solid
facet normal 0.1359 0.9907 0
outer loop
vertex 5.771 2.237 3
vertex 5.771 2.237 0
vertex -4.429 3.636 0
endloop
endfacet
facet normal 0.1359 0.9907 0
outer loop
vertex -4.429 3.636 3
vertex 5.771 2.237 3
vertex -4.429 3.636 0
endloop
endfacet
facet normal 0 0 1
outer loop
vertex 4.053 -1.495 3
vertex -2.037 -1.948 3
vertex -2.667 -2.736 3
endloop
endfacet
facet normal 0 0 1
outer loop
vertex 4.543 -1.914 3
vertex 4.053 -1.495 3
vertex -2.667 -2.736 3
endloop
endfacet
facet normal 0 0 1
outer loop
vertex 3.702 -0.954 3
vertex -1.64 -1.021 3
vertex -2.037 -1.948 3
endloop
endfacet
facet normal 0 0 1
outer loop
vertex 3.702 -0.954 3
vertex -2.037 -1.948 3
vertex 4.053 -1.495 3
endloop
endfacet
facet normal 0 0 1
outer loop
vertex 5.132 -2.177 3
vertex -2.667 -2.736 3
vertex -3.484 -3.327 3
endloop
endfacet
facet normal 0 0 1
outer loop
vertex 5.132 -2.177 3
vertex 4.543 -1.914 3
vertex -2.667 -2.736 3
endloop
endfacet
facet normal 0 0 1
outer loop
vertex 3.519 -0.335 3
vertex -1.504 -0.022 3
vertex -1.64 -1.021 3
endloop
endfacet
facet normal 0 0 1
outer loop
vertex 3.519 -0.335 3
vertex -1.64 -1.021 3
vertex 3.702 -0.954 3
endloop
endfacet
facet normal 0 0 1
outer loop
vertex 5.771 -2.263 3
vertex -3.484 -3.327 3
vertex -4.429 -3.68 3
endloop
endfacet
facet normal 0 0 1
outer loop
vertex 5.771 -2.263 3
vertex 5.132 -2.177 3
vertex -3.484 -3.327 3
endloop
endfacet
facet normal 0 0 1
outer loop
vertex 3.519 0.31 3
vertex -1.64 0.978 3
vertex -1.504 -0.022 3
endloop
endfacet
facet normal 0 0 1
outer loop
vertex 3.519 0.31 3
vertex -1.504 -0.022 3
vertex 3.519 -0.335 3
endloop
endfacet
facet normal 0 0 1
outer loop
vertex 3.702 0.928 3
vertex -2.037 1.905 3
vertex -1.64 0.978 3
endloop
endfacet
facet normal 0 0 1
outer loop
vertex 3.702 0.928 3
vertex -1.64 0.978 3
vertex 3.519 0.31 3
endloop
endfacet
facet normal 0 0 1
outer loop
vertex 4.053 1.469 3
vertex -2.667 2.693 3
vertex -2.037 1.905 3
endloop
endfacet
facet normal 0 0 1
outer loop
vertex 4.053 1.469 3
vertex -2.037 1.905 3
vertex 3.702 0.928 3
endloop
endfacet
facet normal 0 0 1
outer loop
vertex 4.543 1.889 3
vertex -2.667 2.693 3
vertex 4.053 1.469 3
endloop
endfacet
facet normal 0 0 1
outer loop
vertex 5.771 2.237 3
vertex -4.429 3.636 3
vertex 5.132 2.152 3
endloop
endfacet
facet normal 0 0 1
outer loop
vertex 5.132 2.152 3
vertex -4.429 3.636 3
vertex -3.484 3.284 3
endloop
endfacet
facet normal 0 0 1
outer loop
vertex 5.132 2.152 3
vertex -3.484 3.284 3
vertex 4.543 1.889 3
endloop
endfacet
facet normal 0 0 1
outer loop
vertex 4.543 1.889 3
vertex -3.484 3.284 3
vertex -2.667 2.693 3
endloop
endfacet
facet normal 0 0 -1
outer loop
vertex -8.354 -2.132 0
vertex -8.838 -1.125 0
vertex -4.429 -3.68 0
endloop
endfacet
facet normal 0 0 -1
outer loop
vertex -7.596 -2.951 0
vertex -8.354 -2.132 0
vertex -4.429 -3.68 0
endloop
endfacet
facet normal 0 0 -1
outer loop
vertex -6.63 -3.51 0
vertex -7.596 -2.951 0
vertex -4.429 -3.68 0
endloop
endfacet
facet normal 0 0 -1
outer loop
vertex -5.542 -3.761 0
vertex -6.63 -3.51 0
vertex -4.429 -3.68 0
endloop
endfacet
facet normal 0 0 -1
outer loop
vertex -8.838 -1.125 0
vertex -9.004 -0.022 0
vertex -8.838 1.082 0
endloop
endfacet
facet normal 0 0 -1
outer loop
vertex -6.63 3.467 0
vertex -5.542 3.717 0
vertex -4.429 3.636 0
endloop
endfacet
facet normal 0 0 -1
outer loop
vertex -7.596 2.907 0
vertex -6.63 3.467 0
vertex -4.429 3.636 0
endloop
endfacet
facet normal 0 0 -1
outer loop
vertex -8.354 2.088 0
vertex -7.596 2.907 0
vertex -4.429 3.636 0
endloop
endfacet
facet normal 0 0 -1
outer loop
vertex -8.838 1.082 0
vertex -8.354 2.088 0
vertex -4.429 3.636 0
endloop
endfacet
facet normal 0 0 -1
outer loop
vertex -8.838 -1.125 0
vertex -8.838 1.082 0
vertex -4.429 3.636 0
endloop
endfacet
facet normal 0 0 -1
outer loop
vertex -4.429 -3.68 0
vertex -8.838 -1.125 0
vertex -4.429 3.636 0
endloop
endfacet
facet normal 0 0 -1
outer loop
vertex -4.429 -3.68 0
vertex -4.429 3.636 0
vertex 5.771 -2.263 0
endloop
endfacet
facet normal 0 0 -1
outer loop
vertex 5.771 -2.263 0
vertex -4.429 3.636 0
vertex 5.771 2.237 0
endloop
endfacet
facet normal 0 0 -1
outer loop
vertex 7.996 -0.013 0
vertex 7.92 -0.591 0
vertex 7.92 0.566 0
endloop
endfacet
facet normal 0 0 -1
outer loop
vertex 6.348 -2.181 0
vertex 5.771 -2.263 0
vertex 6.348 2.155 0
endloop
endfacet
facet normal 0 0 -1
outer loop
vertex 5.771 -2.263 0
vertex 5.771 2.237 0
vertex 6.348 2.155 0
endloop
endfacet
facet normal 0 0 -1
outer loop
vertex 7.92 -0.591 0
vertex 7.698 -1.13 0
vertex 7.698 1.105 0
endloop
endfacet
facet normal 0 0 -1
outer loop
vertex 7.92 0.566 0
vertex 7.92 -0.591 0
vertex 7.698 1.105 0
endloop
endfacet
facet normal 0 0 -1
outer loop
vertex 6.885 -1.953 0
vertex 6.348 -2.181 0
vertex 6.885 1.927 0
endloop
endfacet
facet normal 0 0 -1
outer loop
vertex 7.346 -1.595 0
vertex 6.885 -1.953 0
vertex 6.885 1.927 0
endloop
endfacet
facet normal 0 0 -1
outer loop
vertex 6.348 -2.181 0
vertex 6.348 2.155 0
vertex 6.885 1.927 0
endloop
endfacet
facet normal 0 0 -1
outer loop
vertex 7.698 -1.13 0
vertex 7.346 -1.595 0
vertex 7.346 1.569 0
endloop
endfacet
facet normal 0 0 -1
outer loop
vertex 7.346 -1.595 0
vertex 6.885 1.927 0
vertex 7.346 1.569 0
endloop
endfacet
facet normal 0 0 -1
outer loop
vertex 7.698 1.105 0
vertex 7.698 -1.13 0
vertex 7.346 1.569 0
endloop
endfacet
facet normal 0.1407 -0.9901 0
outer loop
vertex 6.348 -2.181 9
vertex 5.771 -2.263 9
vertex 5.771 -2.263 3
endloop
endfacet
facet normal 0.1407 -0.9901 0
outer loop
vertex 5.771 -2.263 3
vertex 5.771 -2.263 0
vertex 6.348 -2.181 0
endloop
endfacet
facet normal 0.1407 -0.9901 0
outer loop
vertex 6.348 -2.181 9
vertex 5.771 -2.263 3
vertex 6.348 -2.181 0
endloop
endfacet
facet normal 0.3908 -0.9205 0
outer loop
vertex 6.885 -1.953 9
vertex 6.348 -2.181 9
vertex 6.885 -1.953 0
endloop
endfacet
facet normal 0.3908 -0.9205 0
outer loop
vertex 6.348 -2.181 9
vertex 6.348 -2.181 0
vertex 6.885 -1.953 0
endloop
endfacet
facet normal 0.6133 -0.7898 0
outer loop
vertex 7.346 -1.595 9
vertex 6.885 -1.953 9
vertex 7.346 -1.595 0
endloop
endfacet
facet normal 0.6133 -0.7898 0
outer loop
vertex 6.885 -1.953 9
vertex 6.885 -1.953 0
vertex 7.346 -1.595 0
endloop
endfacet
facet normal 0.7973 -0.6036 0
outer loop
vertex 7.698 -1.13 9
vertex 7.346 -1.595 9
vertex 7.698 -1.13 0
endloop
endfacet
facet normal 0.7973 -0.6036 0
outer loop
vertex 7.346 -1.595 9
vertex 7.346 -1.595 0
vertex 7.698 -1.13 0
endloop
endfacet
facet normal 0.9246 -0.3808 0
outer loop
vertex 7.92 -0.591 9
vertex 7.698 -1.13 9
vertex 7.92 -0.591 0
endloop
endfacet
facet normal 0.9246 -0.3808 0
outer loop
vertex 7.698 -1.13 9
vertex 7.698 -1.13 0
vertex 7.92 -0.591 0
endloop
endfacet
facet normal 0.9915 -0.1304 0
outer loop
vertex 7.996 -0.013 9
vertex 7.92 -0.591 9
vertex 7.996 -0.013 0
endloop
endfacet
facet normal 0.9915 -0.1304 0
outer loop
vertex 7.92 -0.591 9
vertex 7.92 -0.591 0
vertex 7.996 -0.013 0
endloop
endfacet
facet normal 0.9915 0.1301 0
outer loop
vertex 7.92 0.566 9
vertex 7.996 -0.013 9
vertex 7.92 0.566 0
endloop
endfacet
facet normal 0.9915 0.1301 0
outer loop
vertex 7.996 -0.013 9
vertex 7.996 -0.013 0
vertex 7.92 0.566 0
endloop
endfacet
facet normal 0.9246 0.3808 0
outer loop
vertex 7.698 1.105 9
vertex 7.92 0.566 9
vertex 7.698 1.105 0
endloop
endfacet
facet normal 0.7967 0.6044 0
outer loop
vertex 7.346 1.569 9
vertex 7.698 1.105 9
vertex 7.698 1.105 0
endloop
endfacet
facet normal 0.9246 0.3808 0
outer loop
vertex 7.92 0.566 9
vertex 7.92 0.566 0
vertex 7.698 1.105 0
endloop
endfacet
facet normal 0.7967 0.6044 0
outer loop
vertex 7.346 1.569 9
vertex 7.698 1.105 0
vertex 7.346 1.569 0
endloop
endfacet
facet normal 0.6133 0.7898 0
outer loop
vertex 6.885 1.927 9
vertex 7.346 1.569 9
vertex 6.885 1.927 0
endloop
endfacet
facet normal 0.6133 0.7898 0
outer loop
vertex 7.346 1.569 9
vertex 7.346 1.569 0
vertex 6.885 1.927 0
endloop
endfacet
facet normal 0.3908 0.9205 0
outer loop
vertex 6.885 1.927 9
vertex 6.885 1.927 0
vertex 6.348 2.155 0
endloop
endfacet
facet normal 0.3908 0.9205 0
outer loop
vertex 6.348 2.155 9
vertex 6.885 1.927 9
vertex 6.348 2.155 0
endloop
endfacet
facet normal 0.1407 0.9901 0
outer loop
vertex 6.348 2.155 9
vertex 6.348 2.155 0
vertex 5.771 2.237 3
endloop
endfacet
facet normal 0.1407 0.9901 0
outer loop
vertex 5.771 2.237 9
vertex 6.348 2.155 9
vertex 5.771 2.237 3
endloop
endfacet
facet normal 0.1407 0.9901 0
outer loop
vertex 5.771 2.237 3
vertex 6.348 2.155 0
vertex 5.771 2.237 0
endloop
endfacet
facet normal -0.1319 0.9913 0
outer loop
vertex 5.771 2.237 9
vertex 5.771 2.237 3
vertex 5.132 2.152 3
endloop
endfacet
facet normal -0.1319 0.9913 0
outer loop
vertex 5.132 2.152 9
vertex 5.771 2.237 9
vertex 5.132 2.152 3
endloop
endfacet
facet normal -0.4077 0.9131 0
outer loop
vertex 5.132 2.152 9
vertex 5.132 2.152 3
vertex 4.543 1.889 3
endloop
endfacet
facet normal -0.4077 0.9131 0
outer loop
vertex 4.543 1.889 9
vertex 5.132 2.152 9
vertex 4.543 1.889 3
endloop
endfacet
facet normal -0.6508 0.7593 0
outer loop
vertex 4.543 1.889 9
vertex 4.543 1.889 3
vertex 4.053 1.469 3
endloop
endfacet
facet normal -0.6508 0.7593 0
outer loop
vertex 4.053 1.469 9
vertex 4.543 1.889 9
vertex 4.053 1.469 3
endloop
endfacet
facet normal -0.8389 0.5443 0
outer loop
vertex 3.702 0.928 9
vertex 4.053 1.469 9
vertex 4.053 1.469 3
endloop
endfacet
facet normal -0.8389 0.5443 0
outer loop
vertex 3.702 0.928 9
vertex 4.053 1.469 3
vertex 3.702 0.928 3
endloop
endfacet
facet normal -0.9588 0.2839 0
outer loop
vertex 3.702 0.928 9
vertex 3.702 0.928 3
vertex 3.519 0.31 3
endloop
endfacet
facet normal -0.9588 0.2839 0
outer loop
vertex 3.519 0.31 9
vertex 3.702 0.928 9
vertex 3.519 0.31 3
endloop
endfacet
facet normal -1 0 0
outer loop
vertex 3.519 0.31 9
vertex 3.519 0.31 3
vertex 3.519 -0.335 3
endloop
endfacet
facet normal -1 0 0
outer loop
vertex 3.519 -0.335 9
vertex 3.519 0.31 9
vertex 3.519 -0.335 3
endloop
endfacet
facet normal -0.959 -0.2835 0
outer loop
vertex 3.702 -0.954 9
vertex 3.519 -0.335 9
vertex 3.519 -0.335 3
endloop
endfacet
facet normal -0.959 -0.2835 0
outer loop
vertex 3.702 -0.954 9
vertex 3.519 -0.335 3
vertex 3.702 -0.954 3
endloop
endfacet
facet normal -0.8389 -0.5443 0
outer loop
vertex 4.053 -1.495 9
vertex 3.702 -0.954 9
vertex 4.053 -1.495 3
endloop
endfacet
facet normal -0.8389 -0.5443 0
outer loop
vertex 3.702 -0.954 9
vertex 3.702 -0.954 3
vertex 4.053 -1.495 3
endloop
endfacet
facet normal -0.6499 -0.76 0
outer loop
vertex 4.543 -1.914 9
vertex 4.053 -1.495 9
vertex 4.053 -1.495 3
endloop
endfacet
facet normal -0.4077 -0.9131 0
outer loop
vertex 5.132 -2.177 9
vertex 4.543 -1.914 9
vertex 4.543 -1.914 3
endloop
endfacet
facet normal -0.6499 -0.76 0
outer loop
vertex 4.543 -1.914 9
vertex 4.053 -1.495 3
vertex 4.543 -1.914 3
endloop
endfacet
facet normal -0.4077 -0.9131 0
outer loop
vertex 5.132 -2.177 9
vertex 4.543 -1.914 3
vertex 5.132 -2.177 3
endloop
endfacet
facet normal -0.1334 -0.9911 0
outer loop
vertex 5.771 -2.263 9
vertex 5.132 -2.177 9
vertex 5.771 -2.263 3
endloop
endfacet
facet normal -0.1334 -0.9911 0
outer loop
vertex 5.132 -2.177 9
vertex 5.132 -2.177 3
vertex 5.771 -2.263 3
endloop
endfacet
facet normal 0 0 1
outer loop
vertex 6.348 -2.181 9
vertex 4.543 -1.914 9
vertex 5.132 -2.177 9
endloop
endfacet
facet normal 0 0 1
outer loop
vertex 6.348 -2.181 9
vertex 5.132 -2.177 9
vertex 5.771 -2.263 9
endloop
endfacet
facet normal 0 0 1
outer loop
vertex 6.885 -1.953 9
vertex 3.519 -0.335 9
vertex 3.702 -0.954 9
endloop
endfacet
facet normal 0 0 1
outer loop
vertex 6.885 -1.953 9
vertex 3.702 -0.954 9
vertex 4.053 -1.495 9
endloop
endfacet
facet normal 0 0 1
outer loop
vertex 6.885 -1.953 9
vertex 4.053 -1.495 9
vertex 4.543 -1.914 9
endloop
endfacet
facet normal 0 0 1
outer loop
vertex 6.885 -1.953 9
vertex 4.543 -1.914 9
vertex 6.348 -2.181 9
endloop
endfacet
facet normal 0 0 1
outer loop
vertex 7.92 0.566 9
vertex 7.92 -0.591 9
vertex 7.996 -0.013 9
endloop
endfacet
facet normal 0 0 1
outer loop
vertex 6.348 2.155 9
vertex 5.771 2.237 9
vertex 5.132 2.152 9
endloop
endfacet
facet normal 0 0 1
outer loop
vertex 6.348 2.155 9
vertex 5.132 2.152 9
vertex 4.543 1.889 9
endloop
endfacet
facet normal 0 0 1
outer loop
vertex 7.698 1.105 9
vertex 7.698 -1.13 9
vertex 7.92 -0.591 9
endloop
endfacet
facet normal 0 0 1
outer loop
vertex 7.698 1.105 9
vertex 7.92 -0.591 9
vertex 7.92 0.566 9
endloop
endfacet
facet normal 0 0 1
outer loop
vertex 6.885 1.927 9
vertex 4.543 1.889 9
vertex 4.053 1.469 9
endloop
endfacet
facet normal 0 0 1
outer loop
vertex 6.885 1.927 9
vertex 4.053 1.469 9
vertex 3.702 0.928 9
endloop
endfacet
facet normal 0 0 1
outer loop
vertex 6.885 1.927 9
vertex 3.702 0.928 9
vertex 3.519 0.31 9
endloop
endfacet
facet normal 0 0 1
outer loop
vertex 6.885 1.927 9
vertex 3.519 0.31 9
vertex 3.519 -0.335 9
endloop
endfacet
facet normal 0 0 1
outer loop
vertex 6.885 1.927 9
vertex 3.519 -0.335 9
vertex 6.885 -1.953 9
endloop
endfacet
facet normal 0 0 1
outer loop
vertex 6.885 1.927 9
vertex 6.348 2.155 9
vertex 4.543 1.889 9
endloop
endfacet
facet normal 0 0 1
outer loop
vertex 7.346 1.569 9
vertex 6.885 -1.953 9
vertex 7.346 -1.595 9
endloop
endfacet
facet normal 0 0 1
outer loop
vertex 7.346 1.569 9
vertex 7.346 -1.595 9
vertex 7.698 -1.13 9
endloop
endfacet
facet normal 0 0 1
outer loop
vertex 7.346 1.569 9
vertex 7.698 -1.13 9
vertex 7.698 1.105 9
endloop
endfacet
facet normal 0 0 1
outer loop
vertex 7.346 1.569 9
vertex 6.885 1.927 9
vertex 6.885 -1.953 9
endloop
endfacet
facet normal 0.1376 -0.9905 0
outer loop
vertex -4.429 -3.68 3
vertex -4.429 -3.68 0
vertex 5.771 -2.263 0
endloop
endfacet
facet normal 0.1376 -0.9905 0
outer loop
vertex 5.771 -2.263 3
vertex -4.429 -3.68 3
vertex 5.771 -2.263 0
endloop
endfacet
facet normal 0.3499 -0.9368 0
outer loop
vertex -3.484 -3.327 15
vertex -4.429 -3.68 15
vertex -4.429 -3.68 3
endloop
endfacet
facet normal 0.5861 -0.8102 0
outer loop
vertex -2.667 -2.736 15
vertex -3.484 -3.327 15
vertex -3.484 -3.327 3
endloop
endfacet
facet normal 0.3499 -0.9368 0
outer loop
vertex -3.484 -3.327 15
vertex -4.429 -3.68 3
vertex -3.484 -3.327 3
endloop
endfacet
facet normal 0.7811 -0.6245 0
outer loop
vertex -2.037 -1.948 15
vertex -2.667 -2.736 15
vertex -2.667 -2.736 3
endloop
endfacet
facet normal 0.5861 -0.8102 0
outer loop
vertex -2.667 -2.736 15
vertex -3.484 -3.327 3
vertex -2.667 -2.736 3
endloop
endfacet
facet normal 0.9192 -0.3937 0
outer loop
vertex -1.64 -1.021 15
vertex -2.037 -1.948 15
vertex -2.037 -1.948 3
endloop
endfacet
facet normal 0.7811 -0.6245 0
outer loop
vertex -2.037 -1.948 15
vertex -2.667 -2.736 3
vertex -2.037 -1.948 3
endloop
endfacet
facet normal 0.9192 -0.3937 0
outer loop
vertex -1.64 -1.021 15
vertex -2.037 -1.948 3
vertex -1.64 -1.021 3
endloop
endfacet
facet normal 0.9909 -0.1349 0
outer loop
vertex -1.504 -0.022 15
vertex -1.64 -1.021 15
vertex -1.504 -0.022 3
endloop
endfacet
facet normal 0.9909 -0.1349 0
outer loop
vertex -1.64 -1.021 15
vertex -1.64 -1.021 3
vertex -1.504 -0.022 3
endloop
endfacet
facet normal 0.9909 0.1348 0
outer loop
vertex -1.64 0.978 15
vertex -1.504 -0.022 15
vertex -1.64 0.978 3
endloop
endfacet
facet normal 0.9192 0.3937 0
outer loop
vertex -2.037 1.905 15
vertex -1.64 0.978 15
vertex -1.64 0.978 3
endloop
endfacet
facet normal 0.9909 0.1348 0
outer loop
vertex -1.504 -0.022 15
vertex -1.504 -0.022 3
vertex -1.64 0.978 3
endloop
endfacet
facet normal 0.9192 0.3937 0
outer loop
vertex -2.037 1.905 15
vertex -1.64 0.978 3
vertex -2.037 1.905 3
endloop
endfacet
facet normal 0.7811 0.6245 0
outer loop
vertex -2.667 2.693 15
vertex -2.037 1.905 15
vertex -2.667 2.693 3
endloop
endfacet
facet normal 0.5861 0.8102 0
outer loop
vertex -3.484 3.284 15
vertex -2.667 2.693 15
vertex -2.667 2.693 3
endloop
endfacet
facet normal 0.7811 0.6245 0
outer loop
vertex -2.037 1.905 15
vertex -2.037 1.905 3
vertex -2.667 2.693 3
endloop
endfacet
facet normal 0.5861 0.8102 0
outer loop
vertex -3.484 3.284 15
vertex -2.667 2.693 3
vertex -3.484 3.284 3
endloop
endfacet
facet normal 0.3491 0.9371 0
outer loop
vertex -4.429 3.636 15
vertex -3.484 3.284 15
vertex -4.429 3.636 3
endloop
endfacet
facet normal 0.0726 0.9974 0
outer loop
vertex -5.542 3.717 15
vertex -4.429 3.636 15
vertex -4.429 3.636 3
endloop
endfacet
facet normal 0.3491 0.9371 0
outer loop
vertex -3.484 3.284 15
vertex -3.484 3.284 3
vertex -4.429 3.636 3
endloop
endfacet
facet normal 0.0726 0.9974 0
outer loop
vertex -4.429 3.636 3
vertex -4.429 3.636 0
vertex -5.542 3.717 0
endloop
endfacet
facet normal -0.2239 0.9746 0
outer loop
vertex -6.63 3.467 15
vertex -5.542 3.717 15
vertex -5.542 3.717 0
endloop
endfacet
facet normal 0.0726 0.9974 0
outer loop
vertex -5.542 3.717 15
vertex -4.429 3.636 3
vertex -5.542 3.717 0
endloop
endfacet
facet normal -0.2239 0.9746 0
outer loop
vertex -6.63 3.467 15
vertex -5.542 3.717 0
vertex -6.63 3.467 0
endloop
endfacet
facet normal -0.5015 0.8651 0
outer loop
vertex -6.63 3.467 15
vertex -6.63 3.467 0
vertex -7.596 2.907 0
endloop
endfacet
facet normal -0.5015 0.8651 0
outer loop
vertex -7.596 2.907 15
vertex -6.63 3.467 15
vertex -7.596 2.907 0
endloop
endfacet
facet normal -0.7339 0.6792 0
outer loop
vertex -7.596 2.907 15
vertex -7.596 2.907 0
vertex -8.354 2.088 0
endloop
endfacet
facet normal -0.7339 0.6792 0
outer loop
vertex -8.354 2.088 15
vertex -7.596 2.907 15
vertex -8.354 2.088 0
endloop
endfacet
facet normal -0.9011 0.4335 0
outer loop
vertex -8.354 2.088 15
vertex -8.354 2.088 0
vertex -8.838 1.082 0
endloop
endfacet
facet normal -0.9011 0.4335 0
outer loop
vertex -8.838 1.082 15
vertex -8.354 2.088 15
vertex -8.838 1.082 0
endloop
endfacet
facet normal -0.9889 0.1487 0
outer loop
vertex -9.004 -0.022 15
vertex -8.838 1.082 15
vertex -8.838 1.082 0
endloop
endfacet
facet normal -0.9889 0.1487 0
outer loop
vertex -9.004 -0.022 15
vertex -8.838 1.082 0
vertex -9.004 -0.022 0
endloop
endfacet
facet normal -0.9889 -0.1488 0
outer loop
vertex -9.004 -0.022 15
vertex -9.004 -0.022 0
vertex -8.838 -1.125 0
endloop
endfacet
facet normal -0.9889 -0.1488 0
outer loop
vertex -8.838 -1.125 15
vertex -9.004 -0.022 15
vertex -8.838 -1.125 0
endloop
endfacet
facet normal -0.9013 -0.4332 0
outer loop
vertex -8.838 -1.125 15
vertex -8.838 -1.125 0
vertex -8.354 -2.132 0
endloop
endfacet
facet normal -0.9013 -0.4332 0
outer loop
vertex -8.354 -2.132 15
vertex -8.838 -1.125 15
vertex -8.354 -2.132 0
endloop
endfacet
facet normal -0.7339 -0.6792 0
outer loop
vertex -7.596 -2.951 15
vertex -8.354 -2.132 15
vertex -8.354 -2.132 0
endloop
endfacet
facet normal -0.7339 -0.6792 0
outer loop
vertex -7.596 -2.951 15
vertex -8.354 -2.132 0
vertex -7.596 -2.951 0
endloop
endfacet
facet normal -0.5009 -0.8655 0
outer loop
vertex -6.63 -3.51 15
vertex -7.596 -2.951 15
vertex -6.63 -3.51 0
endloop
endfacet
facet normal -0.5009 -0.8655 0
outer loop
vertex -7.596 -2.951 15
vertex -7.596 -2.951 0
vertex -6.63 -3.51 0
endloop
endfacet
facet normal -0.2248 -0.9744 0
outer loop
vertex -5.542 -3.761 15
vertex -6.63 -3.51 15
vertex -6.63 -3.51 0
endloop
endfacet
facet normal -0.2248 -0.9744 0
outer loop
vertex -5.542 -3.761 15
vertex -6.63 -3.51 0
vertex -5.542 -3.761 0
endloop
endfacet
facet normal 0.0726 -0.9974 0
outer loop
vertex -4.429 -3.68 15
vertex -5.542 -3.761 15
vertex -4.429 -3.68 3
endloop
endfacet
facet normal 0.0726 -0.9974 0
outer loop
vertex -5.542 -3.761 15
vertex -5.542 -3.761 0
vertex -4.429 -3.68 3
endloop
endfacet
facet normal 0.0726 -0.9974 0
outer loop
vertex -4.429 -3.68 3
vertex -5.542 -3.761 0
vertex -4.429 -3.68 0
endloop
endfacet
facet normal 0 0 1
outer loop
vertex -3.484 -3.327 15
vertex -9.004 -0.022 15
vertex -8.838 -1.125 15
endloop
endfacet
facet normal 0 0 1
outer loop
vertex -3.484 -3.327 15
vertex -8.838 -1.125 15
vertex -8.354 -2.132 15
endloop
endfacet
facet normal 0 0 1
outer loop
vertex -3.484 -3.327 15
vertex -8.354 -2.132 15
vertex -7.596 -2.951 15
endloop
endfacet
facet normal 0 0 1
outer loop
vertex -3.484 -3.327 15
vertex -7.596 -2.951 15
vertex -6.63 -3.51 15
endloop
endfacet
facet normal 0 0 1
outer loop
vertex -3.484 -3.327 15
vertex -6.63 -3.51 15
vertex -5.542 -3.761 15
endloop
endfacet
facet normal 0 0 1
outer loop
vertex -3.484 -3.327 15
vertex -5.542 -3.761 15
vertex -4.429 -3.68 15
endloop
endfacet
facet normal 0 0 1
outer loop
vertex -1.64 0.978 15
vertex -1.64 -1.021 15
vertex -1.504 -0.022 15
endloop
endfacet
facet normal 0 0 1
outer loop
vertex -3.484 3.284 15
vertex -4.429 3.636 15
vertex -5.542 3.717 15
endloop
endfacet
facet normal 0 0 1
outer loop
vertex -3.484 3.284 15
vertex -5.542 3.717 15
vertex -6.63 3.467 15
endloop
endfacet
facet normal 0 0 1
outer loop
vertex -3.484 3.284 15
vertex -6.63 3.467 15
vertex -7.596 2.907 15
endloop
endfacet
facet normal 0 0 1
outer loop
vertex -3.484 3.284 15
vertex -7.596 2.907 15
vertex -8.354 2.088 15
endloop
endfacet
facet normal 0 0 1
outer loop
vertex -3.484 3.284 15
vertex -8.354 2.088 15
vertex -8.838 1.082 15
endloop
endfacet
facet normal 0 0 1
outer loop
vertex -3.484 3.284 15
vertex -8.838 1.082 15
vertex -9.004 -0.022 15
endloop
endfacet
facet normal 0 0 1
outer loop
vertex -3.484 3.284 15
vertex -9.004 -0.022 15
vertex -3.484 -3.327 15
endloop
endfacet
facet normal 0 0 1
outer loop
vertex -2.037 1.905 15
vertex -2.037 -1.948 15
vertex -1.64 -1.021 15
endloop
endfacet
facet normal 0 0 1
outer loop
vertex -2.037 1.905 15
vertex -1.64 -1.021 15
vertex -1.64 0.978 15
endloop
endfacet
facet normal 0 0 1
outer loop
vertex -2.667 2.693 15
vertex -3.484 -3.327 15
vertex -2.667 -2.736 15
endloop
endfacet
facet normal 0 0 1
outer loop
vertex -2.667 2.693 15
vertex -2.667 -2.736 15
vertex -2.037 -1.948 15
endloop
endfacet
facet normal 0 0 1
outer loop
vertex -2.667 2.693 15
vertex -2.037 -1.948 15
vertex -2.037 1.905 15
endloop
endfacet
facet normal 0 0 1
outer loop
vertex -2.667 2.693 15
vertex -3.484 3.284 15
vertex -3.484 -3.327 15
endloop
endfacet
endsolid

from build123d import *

# Parameters (mm, degrees)
F1_DEPTH = 3
F2_DEPTH = 15
F3_DEPTH = 9


with BuildPart() as f1:
    # F0 (on Top) → F1 (new body)
    with BuildSketch(Plane.XY):
        with BuildLine():
            ThreePointArc((-4.4288796676, -3.6796678124), (-2.3253257096, -2.3633430927), (-1.5043057066, -0.0216394017))
            ThreePointArc((-1.5043057066, -0.0216394017), (-2.3253257096, 2.3200642894), (-4.4288796676, 3.6363890091))
            ThreePointArc((-4.4288796676, 3.6363890091), (-9.0043057066, -0.0216394017), (-4.4288796676, -3.6796678124))
        make_face()
        with BuildLine():
            ThreePointArc((-4.4288796676, 3.6363890091), (-2.3253257096, 2.3200642894), (-1.5043057066, -0.0216394017))
            ThreePointArc((-1.5043057066, -0.0216394017), (-2.3253257096, -2.3633430927), (-4.4288796676, -3.6796678124))
            Line((-4.4288796676, -3.6796678124), (5.7708010962, -2.262551744))
            ThreePointArc((5.7708010962, -2.262551744), (3.4956906544, -0.0126918671), (5.7708010962, 2.2371680098))
            Line((5.7708010962, 2.2371680098), (-4.4288796676, 3.6363890091))
        make_face()
        with BuildLine():
            ThreePointArc((7.9956906544, -0.0126918671), (7.3455341614, 1.5693955998), (5.7708010962, 2.2371680098))
            ThreePointArc((5.7708010962, 2.2371680098), (3.4956906544, -0.0126918671), (5.7708010962, -2.262551744))
            ThreePointArc((5.7708010962, -2.262551744), (7.3455341614, -1.594779334), (7.9956906544, -0.0126918671))
        make_face()
    extrude(amount=F1_DEPTH)

    # F0 (on Top) → F2 (join)
    with BuildSketch(Plane.XY):
        with BuildLine():
            ThreePointArc((-4.4288796676, -3.6796678124), (-2.3253257096, -2.3633430927), (-1.5043057066, -0.0216394017))
            ThreePointArc((-1.5043057066, -0.0216394017), (-2.3253257096, 2.3200642894), (-4.4288796676, 3.6363890091))
            ThreePointArc((-4.4288796676, 3.6363890091), (-9.0043057066, -0.0216394017), (-4.4288796676, -3.6796678124))
        make_face()
    extrude(amount=F2_DEPTH)

    # F0 (on Top) → F3 (join)
    with BuildSketch(Plane.XY):
        with BuildLine():
            ThreePointArc((7.9956906544, -0.0126918671), (7.3455341614, 1.5693955998), (5.7708010962, 2.2371680098))
            ThreePointArc((5.7708010962, 2.2371680098), (3.4956906544, -0.0126918671), (5.7708010962, -2.262551744))
            ThreePointArc((5.7708010962, -2.262551744), (7.3455341614, -1.594779334), (7.9956906544, -0.0126918671))
        make_face()
    extrude(amount=F3_DEPTH)


solid = f1.part
